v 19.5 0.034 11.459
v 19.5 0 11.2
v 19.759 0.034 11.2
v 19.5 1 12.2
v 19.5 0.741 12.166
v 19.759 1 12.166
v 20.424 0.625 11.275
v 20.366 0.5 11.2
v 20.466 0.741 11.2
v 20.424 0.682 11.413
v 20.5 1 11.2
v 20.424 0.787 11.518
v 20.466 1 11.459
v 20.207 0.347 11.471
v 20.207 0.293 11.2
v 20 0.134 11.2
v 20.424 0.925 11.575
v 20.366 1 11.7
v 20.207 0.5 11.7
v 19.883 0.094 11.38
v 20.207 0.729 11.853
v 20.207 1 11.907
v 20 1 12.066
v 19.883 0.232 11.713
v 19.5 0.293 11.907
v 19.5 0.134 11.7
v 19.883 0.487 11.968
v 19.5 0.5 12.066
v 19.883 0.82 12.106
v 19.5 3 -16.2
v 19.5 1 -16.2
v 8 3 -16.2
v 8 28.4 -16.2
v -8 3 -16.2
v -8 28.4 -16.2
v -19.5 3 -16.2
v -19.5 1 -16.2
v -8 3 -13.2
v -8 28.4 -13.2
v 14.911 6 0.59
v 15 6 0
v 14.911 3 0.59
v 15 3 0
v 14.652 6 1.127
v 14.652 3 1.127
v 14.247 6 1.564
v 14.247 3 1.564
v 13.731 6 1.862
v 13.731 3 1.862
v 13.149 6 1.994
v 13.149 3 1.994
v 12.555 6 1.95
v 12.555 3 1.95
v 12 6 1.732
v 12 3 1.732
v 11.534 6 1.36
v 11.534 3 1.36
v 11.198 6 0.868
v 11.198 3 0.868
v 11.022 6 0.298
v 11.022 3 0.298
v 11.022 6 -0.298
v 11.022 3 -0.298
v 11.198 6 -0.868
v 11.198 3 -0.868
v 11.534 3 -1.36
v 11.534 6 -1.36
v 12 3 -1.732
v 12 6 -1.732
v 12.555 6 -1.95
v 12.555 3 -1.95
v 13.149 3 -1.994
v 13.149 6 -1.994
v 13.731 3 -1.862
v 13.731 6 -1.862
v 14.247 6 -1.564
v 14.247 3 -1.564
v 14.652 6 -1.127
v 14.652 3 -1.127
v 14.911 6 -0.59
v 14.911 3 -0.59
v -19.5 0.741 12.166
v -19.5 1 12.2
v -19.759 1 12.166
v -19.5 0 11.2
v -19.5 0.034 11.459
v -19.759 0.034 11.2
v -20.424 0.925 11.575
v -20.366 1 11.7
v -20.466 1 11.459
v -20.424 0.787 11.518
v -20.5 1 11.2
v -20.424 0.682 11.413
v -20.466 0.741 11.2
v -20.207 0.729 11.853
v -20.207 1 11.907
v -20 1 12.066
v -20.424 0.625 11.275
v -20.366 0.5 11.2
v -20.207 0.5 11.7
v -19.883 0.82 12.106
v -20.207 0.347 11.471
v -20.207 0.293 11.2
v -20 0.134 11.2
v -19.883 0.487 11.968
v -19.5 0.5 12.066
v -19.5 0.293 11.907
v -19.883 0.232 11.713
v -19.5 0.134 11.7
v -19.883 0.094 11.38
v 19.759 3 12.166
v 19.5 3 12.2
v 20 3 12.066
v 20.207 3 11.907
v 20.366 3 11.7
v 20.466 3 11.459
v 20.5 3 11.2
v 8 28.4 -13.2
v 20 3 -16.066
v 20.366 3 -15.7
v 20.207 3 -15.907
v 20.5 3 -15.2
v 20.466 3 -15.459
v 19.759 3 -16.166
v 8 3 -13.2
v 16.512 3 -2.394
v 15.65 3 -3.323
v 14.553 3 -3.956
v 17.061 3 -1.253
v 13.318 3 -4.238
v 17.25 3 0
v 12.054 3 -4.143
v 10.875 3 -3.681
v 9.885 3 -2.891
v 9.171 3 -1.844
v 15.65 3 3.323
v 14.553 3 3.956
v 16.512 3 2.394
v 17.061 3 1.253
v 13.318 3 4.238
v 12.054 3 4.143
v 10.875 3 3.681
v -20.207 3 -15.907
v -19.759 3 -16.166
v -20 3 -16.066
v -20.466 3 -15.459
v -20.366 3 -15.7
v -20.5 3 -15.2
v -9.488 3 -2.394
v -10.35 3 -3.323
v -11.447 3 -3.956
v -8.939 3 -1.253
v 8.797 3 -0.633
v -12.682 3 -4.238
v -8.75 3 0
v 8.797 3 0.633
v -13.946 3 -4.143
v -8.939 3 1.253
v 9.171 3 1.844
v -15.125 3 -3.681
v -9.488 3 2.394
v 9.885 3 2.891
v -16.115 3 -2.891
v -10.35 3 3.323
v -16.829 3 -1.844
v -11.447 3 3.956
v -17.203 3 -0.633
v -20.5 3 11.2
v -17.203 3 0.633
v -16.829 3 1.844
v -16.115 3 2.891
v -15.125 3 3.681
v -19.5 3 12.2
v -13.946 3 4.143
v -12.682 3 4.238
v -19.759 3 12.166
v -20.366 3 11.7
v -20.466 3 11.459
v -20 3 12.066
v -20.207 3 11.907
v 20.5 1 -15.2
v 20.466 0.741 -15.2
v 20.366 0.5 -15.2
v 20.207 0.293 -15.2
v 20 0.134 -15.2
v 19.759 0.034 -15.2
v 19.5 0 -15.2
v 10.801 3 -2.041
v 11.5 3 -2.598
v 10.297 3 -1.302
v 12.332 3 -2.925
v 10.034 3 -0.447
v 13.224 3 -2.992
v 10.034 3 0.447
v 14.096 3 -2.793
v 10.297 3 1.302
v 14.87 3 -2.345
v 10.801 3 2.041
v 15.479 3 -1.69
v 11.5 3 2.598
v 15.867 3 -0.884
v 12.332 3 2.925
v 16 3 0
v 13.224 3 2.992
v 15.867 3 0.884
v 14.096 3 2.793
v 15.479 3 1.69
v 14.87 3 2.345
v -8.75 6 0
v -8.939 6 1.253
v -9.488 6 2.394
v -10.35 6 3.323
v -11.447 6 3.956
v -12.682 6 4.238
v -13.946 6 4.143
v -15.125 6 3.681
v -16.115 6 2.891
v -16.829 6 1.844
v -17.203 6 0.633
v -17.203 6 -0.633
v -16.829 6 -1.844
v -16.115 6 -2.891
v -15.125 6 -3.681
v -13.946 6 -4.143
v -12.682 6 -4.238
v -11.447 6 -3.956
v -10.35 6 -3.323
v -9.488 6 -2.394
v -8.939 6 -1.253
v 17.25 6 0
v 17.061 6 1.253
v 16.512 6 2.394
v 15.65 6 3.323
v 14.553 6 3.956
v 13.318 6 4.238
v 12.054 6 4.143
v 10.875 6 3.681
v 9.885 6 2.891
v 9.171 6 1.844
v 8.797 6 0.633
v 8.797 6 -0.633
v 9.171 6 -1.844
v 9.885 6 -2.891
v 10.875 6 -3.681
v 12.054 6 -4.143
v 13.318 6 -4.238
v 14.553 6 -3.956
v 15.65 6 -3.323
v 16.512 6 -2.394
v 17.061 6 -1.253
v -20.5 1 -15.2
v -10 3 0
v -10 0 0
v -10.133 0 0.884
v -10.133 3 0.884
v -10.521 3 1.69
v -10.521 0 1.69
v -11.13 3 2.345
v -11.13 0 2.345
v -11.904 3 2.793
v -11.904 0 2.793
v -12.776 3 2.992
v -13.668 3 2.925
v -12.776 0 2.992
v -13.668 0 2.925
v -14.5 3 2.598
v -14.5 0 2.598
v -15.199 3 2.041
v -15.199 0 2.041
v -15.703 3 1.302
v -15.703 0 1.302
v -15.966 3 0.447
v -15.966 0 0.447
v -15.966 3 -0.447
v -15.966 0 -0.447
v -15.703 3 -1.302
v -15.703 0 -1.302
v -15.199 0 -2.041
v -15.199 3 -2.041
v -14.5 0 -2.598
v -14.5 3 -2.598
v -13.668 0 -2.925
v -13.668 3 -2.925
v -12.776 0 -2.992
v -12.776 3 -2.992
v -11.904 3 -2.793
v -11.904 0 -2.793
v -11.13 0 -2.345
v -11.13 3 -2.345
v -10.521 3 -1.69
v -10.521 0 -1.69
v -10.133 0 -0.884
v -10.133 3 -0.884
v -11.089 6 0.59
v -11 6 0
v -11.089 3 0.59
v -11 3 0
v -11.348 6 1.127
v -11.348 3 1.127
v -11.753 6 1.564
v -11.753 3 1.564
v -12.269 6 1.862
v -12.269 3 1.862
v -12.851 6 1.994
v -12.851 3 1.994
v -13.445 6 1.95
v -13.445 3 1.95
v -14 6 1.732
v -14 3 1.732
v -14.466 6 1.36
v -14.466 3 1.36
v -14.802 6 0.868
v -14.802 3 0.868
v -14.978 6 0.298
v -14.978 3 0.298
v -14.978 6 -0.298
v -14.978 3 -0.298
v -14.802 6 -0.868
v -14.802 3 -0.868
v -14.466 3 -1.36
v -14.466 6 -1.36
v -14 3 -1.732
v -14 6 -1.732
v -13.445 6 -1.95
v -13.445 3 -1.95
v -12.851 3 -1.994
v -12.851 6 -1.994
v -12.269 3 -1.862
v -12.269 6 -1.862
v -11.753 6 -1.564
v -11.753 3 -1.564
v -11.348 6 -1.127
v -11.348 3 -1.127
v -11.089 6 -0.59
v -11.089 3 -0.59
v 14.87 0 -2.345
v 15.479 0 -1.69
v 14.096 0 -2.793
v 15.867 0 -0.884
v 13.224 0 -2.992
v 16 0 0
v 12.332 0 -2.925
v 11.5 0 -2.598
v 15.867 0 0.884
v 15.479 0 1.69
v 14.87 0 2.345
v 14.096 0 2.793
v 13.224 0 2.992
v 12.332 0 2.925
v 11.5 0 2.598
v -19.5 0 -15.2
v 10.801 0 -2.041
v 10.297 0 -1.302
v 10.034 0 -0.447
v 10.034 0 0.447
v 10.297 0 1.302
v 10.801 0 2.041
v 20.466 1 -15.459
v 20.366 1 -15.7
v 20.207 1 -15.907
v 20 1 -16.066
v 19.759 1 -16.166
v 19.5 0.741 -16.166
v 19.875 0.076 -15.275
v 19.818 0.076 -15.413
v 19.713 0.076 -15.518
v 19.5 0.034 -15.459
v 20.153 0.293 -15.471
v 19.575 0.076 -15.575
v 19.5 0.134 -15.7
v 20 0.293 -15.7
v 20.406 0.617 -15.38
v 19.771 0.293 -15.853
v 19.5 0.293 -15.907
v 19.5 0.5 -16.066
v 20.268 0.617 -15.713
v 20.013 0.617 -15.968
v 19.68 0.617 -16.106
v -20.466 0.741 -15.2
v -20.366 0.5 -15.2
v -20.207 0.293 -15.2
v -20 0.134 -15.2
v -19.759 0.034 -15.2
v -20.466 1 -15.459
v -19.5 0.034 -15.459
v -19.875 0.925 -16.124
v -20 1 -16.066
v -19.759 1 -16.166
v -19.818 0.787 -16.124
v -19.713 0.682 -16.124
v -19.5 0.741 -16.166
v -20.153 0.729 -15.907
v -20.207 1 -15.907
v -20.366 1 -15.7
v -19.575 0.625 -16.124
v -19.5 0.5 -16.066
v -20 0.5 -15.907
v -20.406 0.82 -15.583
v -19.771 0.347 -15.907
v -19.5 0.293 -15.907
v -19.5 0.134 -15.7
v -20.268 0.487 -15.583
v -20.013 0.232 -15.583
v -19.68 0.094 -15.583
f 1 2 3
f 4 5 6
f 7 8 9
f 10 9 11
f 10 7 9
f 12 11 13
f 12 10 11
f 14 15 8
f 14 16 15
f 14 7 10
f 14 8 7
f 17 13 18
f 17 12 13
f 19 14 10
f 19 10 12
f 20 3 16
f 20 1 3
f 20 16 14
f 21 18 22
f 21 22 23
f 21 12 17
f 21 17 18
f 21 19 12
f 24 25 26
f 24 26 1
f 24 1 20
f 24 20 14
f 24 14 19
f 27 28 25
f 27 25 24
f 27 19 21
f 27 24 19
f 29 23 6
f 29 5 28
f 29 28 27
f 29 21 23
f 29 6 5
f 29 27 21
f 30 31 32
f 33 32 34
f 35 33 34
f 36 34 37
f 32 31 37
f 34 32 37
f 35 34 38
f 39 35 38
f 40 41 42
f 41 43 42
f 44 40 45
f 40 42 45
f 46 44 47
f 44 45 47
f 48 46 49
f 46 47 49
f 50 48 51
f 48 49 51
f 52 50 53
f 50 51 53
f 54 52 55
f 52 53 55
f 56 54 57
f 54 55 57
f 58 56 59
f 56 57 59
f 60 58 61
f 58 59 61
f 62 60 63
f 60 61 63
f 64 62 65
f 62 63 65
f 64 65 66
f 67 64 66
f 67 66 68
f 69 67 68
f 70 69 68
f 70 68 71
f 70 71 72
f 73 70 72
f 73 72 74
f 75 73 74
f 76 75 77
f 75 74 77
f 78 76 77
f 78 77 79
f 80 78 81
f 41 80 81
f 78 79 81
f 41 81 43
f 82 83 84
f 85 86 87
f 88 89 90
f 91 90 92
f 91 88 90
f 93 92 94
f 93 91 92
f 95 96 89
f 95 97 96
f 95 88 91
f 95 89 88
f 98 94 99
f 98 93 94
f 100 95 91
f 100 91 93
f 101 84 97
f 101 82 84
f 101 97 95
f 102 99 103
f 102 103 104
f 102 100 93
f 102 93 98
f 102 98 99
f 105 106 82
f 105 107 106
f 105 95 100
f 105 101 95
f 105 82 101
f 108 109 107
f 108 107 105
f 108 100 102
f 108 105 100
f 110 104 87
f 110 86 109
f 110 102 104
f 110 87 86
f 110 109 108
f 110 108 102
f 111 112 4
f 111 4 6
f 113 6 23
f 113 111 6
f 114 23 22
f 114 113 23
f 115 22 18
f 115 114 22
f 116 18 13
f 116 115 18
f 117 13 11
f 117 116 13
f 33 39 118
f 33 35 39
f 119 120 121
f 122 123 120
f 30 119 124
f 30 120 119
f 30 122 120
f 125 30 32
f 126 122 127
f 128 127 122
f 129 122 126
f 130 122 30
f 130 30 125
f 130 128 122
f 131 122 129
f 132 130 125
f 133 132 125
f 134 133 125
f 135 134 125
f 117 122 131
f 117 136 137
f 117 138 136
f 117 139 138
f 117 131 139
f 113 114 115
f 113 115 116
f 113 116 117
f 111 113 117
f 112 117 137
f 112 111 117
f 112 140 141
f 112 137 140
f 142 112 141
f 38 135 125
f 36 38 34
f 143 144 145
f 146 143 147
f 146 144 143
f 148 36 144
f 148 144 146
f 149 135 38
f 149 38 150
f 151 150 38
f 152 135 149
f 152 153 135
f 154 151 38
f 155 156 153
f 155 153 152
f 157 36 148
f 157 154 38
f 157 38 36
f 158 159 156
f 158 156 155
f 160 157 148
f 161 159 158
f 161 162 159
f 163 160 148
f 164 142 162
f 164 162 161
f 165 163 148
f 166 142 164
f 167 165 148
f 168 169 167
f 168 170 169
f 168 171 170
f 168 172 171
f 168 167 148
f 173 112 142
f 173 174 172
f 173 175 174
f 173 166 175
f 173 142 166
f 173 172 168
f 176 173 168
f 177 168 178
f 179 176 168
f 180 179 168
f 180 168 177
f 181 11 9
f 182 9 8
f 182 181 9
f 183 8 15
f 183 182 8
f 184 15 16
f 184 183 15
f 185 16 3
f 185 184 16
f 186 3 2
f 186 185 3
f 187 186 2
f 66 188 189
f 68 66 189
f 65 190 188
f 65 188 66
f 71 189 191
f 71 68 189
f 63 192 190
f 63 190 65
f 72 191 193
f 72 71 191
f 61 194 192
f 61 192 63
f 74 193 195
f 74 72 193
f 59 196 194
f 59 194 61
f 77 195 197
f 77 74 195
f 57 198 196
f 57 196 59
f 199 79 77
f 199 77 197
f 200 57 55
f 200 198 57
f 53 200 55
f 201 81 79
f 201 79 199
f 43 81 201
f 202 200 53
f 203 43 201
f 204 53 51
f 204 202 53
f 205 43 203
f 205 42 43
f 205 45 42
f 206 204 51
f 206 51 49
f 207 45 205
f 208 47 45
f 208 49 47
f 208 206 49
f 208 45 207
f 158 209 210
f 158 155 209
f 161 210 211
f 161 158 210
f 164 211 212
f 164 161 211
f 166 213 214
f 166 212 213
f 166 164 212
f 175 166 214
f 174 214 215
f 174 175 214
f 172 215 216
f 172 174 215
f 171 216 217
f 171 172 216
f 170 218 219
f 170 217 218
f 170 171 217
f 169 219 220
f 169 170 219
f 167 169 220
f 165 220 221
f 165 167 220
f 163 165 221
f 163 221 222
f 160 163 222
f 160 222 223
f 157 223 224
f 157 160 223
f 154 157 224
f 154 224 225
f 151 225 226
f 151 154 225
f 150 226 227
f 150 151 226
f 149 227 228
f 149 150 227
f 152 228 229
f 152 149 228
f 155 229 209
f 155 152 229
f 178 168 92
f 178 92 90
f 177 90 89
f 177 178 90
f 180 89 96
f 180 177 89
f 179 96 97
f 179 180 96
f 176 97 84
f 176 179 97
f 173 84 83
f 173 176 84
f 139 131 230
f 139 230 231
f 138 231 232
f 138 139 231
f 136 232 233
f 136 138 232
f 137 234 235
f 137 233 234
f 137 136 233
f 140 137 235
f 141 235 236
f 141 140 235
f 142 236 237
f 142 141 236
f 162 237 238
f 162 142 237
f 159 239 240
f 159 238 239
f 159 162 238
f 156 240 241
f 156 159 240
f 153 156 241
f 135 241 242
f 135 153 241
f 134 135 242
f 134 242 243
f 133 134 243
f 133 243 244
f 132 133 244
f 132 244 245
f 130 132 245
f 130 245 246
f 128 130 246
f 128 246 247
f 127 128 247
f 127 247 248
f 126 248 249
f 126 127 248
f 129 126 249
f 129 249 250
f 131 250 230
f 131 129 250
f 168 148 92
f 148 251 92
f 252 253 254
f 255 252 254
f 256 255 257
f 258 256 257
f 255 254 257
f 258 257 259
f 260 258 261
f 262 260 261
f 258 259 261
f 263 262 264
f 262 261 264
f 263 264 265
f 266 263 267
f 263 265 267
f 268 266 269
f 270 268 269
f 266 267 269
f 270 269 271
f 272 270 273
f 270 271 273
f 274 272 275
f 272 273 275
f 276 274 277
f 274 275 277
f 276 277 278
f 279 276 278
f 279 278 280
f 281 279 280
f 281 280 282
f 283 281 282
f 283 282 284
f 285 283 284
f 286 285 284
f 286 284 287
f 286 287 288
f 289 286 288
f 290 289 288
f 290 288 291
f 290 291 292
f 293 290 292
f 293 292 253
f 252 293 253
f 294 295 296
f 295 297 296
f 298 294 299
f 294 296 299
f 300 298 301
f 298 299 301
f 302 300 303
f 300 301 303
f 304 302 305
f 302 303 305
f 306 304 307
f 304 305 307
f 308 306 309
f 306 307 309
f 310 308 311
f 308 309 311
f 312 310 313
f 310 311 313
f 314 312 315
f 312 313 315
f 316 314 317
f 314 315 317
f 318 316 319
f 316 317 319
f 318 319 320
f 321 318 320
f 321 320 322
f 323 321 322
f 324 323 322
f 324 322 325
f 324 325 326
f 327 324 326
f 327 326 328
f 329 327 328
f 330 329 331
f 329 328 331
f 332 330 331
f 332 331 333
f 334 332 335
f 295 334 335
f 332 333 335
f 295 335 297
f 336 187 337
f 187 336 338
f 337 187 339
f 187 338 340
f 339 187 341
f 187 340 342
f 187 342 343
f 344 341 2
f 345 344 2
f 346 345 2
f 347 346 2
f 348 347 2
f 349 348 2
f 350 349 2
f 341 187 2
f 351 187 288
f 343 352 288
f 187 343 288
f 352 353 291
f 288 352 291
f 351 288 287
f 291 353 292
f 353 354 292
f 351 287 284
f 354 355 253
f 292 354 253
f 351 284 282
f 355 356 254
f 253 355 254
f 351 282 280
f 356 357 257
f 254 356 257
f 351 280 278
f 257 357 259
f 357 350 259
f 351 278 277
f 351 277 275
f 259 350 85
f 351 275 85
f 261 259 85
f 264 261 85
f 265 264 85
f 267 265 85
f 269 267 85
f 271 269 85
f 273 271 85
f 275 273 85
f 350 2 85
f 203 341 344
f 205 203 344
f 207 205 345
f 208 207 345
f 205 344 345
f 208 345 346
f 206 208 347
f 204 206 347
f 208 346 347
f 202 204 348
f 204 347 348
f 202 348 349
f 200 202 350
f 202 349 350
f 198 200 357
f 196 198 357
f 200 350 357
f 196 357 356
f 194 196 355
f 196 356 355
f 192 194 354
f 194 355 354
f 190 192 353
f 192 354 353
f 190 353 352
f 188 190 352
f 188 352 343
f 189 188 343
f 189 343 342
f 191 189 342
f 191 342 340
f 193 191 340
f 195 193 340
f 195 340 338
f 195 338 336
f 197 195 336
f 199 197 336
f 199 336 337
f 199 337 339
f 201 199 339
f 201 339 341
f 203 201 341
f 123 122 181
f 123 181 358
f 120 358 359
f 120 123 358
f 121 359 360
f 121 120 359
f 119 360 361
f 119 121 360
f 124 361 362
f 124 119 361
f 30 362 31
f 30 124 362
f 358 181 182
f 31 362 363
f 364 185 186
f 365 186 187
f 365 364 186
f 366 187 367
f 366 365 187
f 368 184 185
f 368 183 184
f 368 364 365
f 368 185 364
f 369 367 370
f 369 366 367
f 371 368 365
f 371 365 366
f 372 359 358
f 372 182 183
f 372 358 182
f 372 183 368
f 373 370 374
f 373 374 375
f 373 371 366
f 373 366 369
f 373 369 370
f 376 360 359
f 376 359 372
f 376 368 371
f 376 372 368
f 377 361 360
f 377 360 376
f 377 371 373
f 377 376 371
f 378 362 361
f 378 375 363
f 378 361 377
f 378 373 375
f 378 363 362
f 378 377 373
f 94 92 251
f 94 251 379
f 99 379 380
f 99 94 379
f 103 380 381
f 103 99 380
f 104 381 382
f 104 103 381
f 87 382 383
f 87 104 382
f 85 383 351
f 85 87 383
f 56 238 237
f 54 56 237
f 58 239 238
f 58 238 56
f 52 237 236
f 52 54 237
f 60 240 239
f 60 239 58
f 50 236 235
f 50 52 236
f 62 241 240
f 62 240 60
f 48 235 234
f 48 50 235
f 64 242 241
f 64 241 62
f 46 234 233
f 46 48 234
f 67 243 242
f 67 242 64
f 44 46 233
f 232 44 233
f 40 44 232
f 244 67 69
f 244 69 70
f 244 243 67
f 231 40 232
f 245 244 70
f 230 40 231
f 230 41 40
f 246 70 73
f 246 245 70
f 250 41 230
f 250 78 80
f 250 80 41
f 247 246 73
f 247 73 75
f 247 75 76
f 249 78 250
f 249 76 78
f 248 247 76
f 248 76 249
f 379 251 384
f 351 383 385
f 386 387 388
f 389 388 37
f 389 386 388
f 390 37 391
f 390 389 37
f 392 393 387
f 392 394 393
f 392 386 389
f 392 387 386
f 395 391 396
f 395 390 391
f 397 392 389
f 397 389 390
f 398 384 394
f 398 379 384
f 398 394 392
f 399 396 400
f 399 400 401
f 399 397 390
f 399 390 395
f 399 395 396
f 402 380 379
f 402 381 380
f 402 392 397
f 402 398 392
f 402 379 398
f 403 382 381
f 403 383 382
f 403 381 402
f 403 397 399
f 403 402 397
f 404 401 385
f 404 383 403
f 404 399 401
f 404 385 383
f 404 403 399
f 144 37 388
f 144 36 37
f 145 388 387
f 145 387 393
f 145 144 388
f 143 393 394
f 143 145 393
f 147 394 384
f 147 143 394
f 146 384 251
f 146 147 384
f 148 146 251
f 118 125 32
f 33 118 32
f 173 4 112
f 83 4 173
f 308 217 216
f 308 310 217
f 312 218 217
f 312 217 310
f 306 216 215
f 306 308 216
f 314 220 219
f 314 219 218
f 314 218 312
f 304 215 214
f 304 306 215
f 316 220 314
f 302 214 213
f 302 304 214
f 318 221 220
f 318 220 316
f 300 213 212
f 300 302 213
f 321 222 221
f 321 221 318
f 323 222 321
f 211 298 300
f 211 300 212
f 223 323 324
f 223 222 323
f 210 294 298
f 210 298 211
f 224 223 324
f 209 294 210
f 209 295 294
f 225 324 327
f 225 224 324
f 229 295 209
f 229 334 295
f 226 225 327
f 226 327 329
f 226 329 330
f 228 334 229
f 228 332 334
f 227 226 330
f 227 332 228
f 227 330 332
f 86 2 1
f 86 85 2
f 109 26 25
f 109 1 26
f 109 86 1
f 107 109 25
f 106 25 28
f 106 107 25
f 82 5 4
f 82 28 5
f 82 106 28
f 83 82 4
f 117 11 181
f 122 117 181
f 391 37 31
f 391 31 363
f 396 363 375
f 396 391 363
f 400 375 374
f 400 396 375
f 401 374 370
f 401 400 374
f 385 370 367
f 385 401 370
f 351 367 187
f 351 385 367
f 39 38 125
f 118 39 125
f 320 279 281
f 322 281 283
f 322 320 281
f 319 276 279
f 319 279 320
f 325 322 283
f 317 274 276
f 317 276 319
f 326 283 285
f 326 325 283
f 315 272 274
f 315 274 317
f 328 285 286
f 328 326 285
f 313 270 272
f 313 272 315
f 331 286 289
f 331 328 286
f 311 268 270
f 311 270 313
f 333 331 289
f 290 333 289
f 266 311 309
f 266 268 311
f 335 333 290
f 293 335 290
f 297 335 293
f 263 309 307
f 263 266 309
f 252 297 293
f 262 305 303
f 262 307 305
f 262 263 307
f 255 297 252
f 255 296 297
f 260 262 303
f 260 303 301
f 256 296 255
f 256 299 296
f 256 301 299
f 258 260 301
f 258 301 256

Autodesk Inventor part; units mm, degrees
ref_plane "YZ Plane" through (0, 0, 0) normal (1, 0, 0) x (0, 1, 0)
ref_plane "XZ Plane" through (0, 0, 0) normal (0, 1, 0) x (-1, 0, 0)
ref_plane "XY Plane" through (0, 0, 0) normal (0, 0, 1) x (1, 0, 0)
sketch "Sketch1" plane through (0, 0, 0) normal (0, 1, 0) x (-1, 0, 0)
  line L0 (20.5, 16.2) -> (-20.5, 16.2)
  line L1 (-20.5, 16.2) -> (-20.5, -16.2)
  line L2 (-20.5, -16.2) -> (20.5, -16.2)
  line L3 (20.5, -16.2) -> (20.5, 16.2)
  point P0 (0, 0)
  dimension "d0" = 41
  dimension "d1" = 32.4
extrude "Extrusion1" add sketch "Sketch1" along normal blind 3
sketch "Sketch4" plane through (20.5, 0, -16.2) normal (0, 0, -1) x (-1, 0, 0)
  line L0 (41, 3) -> (0, 3) projected
  line L1 (0, 28.4) -> (41, 28.4) projected
  line L2 (0, 3) -> (21.5, 3)
  line L3 (21.5, 3) -> (21.5, 28.4)
  line L4 (21.5, 28.4) -> (0, 28.4)
  line L5 (0, 28.4) -> (0, 3)
  point P0 (20.5, 0)
  dimension "d12" = 21.5
extrude "Extrusion4" cut sketch "Sketch4" against normal blind 3
sketch "Sketch5" plane through (-20.5, 0, 16.2) normal (0, 0, 1) x (1, 0, 0)
  line L0 (41, 28.4) -> (0, 28.4) projected
  line L1 (41, 3) -> (0, 3) projected
  line L2 (0, 28.4) -> (21.5, 28.4)
  line L3 (21.5, 28.4) -> (21.5, 3)
  line L4 (21.5, 3) -> (0, 3)
  line L5 (0, 3) -> (0, 28.4)
  point P0 (20.5, 0)
  point P1 (19.5, 3)
  point P2 (19.5, 3)
  dimension "d15" = 21.5
extrude "Extrusion5" cut sketch "Sketch5" against normal blind 3
sketch "Sketch6" plane through (0, 3, 0) normal (0, 1, 0) x (1, 0, 0)
  circle A0 centre (13, 0) radius 4.25
  circle A1 centre (-13, 0) radius 4.25
  point P0 (0, 0)
  dimension "d20" = 8.5
  dimension "d21" = 8.5
extrude "Extrusion6" add sketch "Sketch6" along normal blind 3
sketch "Sketch7" plane through (0, 0, 0) normal (0, -1, 0) x (1, 0, 0)
  circle A0 centre (-13, 0) radius 4.25 projected
  circle A1 centre (-13, 0) radius 2
  circle A2 centre (13, 0) radius 4.25 projected
  circle A3 centre (13, 0) radius 2
  point P0 (0, 0)
  dimension "d24" = 4
  dimension "d25" = 4
extrude "Extrusion7" cut sketch "Sketch7" against normal blind 6 contours A1 | A3
sketch "Sketch8" plane through (0, 0, 0) normal (0, -1, 0) x (1, 0, 0)
  circle A0 centre (-13, 0) radius 2 projected
  circle A1 centre (-13, 0) radius 3
  circle A2 centre (13, 0) radius 2 projected
  circle A3 centre (13, 0) radius 3
  point P0 (0, 0)
  dimension "d28" = 6
  dimension "d29" = 6
extrude "Extrusion8" cut sketch "Sketch8" against normal blind 3 contours A0 | A1 | A2 | A3
sketch "Sketch16" plane through (0, 0, 0) normal (0, -1, 0) x (1, 0, 0)
  line L0 (-20.5, 16.2) -> (20.5, 16.2) projected
  line L1 (20.5, 16.2) -> (20.5, -16.2) projected
  line L2 (-20.5, 16.2) -> (20.5, 16.2)
  line L3 (20.5, 16.2) -> (20.5, 12.2)
  line L4 (20.5, 12.2) -> (-20.5, 12.2)
  line L5 (-20.5, 12.2) -> (-20.5, 16.2)
  point P0 (0, 0)
  point P1 (1, 16.2)
  point P2 (1, 16.2)
  dimension "d56" = 4
extrude "Extrusion15" cut sketch "Sketch16" against normal blind 50
sketch "Sketch17" plane through (0, 3, 0) normal (0, 1, 0) x (1, 0, 0)
  line L0 (20.5, 16.2) -> (-20.5, 16.2) projected
  line L1 (8, 16.2) -> (-8, 16.2)
  line L2 (-8, 16.2) -> (-8, 13.2)
  line L3 (-8, 13.2) -> (8, 13.2)
  line L4 (8, 13.2) -> (8, 16.2)
  point P0 (0, 0)
  dimension "d59" = 16
  dimension "d60" = 3
extrude "Extrusion16" add sketch "Sketch17" along normal blind 25.4
fillet "Fillet3" radius 1 8 edges at (0, 0, 12.2) (-20.5, 1.5, 12.2) (20.5, 1.5, 12.2) (20.5, 1.5, -16.2) (20.5, 0, -2) (-20.5, 0, -2) (-20.5, 1.5, -16.2) (0, 0, -16.2)
properties part number "zMount2"
